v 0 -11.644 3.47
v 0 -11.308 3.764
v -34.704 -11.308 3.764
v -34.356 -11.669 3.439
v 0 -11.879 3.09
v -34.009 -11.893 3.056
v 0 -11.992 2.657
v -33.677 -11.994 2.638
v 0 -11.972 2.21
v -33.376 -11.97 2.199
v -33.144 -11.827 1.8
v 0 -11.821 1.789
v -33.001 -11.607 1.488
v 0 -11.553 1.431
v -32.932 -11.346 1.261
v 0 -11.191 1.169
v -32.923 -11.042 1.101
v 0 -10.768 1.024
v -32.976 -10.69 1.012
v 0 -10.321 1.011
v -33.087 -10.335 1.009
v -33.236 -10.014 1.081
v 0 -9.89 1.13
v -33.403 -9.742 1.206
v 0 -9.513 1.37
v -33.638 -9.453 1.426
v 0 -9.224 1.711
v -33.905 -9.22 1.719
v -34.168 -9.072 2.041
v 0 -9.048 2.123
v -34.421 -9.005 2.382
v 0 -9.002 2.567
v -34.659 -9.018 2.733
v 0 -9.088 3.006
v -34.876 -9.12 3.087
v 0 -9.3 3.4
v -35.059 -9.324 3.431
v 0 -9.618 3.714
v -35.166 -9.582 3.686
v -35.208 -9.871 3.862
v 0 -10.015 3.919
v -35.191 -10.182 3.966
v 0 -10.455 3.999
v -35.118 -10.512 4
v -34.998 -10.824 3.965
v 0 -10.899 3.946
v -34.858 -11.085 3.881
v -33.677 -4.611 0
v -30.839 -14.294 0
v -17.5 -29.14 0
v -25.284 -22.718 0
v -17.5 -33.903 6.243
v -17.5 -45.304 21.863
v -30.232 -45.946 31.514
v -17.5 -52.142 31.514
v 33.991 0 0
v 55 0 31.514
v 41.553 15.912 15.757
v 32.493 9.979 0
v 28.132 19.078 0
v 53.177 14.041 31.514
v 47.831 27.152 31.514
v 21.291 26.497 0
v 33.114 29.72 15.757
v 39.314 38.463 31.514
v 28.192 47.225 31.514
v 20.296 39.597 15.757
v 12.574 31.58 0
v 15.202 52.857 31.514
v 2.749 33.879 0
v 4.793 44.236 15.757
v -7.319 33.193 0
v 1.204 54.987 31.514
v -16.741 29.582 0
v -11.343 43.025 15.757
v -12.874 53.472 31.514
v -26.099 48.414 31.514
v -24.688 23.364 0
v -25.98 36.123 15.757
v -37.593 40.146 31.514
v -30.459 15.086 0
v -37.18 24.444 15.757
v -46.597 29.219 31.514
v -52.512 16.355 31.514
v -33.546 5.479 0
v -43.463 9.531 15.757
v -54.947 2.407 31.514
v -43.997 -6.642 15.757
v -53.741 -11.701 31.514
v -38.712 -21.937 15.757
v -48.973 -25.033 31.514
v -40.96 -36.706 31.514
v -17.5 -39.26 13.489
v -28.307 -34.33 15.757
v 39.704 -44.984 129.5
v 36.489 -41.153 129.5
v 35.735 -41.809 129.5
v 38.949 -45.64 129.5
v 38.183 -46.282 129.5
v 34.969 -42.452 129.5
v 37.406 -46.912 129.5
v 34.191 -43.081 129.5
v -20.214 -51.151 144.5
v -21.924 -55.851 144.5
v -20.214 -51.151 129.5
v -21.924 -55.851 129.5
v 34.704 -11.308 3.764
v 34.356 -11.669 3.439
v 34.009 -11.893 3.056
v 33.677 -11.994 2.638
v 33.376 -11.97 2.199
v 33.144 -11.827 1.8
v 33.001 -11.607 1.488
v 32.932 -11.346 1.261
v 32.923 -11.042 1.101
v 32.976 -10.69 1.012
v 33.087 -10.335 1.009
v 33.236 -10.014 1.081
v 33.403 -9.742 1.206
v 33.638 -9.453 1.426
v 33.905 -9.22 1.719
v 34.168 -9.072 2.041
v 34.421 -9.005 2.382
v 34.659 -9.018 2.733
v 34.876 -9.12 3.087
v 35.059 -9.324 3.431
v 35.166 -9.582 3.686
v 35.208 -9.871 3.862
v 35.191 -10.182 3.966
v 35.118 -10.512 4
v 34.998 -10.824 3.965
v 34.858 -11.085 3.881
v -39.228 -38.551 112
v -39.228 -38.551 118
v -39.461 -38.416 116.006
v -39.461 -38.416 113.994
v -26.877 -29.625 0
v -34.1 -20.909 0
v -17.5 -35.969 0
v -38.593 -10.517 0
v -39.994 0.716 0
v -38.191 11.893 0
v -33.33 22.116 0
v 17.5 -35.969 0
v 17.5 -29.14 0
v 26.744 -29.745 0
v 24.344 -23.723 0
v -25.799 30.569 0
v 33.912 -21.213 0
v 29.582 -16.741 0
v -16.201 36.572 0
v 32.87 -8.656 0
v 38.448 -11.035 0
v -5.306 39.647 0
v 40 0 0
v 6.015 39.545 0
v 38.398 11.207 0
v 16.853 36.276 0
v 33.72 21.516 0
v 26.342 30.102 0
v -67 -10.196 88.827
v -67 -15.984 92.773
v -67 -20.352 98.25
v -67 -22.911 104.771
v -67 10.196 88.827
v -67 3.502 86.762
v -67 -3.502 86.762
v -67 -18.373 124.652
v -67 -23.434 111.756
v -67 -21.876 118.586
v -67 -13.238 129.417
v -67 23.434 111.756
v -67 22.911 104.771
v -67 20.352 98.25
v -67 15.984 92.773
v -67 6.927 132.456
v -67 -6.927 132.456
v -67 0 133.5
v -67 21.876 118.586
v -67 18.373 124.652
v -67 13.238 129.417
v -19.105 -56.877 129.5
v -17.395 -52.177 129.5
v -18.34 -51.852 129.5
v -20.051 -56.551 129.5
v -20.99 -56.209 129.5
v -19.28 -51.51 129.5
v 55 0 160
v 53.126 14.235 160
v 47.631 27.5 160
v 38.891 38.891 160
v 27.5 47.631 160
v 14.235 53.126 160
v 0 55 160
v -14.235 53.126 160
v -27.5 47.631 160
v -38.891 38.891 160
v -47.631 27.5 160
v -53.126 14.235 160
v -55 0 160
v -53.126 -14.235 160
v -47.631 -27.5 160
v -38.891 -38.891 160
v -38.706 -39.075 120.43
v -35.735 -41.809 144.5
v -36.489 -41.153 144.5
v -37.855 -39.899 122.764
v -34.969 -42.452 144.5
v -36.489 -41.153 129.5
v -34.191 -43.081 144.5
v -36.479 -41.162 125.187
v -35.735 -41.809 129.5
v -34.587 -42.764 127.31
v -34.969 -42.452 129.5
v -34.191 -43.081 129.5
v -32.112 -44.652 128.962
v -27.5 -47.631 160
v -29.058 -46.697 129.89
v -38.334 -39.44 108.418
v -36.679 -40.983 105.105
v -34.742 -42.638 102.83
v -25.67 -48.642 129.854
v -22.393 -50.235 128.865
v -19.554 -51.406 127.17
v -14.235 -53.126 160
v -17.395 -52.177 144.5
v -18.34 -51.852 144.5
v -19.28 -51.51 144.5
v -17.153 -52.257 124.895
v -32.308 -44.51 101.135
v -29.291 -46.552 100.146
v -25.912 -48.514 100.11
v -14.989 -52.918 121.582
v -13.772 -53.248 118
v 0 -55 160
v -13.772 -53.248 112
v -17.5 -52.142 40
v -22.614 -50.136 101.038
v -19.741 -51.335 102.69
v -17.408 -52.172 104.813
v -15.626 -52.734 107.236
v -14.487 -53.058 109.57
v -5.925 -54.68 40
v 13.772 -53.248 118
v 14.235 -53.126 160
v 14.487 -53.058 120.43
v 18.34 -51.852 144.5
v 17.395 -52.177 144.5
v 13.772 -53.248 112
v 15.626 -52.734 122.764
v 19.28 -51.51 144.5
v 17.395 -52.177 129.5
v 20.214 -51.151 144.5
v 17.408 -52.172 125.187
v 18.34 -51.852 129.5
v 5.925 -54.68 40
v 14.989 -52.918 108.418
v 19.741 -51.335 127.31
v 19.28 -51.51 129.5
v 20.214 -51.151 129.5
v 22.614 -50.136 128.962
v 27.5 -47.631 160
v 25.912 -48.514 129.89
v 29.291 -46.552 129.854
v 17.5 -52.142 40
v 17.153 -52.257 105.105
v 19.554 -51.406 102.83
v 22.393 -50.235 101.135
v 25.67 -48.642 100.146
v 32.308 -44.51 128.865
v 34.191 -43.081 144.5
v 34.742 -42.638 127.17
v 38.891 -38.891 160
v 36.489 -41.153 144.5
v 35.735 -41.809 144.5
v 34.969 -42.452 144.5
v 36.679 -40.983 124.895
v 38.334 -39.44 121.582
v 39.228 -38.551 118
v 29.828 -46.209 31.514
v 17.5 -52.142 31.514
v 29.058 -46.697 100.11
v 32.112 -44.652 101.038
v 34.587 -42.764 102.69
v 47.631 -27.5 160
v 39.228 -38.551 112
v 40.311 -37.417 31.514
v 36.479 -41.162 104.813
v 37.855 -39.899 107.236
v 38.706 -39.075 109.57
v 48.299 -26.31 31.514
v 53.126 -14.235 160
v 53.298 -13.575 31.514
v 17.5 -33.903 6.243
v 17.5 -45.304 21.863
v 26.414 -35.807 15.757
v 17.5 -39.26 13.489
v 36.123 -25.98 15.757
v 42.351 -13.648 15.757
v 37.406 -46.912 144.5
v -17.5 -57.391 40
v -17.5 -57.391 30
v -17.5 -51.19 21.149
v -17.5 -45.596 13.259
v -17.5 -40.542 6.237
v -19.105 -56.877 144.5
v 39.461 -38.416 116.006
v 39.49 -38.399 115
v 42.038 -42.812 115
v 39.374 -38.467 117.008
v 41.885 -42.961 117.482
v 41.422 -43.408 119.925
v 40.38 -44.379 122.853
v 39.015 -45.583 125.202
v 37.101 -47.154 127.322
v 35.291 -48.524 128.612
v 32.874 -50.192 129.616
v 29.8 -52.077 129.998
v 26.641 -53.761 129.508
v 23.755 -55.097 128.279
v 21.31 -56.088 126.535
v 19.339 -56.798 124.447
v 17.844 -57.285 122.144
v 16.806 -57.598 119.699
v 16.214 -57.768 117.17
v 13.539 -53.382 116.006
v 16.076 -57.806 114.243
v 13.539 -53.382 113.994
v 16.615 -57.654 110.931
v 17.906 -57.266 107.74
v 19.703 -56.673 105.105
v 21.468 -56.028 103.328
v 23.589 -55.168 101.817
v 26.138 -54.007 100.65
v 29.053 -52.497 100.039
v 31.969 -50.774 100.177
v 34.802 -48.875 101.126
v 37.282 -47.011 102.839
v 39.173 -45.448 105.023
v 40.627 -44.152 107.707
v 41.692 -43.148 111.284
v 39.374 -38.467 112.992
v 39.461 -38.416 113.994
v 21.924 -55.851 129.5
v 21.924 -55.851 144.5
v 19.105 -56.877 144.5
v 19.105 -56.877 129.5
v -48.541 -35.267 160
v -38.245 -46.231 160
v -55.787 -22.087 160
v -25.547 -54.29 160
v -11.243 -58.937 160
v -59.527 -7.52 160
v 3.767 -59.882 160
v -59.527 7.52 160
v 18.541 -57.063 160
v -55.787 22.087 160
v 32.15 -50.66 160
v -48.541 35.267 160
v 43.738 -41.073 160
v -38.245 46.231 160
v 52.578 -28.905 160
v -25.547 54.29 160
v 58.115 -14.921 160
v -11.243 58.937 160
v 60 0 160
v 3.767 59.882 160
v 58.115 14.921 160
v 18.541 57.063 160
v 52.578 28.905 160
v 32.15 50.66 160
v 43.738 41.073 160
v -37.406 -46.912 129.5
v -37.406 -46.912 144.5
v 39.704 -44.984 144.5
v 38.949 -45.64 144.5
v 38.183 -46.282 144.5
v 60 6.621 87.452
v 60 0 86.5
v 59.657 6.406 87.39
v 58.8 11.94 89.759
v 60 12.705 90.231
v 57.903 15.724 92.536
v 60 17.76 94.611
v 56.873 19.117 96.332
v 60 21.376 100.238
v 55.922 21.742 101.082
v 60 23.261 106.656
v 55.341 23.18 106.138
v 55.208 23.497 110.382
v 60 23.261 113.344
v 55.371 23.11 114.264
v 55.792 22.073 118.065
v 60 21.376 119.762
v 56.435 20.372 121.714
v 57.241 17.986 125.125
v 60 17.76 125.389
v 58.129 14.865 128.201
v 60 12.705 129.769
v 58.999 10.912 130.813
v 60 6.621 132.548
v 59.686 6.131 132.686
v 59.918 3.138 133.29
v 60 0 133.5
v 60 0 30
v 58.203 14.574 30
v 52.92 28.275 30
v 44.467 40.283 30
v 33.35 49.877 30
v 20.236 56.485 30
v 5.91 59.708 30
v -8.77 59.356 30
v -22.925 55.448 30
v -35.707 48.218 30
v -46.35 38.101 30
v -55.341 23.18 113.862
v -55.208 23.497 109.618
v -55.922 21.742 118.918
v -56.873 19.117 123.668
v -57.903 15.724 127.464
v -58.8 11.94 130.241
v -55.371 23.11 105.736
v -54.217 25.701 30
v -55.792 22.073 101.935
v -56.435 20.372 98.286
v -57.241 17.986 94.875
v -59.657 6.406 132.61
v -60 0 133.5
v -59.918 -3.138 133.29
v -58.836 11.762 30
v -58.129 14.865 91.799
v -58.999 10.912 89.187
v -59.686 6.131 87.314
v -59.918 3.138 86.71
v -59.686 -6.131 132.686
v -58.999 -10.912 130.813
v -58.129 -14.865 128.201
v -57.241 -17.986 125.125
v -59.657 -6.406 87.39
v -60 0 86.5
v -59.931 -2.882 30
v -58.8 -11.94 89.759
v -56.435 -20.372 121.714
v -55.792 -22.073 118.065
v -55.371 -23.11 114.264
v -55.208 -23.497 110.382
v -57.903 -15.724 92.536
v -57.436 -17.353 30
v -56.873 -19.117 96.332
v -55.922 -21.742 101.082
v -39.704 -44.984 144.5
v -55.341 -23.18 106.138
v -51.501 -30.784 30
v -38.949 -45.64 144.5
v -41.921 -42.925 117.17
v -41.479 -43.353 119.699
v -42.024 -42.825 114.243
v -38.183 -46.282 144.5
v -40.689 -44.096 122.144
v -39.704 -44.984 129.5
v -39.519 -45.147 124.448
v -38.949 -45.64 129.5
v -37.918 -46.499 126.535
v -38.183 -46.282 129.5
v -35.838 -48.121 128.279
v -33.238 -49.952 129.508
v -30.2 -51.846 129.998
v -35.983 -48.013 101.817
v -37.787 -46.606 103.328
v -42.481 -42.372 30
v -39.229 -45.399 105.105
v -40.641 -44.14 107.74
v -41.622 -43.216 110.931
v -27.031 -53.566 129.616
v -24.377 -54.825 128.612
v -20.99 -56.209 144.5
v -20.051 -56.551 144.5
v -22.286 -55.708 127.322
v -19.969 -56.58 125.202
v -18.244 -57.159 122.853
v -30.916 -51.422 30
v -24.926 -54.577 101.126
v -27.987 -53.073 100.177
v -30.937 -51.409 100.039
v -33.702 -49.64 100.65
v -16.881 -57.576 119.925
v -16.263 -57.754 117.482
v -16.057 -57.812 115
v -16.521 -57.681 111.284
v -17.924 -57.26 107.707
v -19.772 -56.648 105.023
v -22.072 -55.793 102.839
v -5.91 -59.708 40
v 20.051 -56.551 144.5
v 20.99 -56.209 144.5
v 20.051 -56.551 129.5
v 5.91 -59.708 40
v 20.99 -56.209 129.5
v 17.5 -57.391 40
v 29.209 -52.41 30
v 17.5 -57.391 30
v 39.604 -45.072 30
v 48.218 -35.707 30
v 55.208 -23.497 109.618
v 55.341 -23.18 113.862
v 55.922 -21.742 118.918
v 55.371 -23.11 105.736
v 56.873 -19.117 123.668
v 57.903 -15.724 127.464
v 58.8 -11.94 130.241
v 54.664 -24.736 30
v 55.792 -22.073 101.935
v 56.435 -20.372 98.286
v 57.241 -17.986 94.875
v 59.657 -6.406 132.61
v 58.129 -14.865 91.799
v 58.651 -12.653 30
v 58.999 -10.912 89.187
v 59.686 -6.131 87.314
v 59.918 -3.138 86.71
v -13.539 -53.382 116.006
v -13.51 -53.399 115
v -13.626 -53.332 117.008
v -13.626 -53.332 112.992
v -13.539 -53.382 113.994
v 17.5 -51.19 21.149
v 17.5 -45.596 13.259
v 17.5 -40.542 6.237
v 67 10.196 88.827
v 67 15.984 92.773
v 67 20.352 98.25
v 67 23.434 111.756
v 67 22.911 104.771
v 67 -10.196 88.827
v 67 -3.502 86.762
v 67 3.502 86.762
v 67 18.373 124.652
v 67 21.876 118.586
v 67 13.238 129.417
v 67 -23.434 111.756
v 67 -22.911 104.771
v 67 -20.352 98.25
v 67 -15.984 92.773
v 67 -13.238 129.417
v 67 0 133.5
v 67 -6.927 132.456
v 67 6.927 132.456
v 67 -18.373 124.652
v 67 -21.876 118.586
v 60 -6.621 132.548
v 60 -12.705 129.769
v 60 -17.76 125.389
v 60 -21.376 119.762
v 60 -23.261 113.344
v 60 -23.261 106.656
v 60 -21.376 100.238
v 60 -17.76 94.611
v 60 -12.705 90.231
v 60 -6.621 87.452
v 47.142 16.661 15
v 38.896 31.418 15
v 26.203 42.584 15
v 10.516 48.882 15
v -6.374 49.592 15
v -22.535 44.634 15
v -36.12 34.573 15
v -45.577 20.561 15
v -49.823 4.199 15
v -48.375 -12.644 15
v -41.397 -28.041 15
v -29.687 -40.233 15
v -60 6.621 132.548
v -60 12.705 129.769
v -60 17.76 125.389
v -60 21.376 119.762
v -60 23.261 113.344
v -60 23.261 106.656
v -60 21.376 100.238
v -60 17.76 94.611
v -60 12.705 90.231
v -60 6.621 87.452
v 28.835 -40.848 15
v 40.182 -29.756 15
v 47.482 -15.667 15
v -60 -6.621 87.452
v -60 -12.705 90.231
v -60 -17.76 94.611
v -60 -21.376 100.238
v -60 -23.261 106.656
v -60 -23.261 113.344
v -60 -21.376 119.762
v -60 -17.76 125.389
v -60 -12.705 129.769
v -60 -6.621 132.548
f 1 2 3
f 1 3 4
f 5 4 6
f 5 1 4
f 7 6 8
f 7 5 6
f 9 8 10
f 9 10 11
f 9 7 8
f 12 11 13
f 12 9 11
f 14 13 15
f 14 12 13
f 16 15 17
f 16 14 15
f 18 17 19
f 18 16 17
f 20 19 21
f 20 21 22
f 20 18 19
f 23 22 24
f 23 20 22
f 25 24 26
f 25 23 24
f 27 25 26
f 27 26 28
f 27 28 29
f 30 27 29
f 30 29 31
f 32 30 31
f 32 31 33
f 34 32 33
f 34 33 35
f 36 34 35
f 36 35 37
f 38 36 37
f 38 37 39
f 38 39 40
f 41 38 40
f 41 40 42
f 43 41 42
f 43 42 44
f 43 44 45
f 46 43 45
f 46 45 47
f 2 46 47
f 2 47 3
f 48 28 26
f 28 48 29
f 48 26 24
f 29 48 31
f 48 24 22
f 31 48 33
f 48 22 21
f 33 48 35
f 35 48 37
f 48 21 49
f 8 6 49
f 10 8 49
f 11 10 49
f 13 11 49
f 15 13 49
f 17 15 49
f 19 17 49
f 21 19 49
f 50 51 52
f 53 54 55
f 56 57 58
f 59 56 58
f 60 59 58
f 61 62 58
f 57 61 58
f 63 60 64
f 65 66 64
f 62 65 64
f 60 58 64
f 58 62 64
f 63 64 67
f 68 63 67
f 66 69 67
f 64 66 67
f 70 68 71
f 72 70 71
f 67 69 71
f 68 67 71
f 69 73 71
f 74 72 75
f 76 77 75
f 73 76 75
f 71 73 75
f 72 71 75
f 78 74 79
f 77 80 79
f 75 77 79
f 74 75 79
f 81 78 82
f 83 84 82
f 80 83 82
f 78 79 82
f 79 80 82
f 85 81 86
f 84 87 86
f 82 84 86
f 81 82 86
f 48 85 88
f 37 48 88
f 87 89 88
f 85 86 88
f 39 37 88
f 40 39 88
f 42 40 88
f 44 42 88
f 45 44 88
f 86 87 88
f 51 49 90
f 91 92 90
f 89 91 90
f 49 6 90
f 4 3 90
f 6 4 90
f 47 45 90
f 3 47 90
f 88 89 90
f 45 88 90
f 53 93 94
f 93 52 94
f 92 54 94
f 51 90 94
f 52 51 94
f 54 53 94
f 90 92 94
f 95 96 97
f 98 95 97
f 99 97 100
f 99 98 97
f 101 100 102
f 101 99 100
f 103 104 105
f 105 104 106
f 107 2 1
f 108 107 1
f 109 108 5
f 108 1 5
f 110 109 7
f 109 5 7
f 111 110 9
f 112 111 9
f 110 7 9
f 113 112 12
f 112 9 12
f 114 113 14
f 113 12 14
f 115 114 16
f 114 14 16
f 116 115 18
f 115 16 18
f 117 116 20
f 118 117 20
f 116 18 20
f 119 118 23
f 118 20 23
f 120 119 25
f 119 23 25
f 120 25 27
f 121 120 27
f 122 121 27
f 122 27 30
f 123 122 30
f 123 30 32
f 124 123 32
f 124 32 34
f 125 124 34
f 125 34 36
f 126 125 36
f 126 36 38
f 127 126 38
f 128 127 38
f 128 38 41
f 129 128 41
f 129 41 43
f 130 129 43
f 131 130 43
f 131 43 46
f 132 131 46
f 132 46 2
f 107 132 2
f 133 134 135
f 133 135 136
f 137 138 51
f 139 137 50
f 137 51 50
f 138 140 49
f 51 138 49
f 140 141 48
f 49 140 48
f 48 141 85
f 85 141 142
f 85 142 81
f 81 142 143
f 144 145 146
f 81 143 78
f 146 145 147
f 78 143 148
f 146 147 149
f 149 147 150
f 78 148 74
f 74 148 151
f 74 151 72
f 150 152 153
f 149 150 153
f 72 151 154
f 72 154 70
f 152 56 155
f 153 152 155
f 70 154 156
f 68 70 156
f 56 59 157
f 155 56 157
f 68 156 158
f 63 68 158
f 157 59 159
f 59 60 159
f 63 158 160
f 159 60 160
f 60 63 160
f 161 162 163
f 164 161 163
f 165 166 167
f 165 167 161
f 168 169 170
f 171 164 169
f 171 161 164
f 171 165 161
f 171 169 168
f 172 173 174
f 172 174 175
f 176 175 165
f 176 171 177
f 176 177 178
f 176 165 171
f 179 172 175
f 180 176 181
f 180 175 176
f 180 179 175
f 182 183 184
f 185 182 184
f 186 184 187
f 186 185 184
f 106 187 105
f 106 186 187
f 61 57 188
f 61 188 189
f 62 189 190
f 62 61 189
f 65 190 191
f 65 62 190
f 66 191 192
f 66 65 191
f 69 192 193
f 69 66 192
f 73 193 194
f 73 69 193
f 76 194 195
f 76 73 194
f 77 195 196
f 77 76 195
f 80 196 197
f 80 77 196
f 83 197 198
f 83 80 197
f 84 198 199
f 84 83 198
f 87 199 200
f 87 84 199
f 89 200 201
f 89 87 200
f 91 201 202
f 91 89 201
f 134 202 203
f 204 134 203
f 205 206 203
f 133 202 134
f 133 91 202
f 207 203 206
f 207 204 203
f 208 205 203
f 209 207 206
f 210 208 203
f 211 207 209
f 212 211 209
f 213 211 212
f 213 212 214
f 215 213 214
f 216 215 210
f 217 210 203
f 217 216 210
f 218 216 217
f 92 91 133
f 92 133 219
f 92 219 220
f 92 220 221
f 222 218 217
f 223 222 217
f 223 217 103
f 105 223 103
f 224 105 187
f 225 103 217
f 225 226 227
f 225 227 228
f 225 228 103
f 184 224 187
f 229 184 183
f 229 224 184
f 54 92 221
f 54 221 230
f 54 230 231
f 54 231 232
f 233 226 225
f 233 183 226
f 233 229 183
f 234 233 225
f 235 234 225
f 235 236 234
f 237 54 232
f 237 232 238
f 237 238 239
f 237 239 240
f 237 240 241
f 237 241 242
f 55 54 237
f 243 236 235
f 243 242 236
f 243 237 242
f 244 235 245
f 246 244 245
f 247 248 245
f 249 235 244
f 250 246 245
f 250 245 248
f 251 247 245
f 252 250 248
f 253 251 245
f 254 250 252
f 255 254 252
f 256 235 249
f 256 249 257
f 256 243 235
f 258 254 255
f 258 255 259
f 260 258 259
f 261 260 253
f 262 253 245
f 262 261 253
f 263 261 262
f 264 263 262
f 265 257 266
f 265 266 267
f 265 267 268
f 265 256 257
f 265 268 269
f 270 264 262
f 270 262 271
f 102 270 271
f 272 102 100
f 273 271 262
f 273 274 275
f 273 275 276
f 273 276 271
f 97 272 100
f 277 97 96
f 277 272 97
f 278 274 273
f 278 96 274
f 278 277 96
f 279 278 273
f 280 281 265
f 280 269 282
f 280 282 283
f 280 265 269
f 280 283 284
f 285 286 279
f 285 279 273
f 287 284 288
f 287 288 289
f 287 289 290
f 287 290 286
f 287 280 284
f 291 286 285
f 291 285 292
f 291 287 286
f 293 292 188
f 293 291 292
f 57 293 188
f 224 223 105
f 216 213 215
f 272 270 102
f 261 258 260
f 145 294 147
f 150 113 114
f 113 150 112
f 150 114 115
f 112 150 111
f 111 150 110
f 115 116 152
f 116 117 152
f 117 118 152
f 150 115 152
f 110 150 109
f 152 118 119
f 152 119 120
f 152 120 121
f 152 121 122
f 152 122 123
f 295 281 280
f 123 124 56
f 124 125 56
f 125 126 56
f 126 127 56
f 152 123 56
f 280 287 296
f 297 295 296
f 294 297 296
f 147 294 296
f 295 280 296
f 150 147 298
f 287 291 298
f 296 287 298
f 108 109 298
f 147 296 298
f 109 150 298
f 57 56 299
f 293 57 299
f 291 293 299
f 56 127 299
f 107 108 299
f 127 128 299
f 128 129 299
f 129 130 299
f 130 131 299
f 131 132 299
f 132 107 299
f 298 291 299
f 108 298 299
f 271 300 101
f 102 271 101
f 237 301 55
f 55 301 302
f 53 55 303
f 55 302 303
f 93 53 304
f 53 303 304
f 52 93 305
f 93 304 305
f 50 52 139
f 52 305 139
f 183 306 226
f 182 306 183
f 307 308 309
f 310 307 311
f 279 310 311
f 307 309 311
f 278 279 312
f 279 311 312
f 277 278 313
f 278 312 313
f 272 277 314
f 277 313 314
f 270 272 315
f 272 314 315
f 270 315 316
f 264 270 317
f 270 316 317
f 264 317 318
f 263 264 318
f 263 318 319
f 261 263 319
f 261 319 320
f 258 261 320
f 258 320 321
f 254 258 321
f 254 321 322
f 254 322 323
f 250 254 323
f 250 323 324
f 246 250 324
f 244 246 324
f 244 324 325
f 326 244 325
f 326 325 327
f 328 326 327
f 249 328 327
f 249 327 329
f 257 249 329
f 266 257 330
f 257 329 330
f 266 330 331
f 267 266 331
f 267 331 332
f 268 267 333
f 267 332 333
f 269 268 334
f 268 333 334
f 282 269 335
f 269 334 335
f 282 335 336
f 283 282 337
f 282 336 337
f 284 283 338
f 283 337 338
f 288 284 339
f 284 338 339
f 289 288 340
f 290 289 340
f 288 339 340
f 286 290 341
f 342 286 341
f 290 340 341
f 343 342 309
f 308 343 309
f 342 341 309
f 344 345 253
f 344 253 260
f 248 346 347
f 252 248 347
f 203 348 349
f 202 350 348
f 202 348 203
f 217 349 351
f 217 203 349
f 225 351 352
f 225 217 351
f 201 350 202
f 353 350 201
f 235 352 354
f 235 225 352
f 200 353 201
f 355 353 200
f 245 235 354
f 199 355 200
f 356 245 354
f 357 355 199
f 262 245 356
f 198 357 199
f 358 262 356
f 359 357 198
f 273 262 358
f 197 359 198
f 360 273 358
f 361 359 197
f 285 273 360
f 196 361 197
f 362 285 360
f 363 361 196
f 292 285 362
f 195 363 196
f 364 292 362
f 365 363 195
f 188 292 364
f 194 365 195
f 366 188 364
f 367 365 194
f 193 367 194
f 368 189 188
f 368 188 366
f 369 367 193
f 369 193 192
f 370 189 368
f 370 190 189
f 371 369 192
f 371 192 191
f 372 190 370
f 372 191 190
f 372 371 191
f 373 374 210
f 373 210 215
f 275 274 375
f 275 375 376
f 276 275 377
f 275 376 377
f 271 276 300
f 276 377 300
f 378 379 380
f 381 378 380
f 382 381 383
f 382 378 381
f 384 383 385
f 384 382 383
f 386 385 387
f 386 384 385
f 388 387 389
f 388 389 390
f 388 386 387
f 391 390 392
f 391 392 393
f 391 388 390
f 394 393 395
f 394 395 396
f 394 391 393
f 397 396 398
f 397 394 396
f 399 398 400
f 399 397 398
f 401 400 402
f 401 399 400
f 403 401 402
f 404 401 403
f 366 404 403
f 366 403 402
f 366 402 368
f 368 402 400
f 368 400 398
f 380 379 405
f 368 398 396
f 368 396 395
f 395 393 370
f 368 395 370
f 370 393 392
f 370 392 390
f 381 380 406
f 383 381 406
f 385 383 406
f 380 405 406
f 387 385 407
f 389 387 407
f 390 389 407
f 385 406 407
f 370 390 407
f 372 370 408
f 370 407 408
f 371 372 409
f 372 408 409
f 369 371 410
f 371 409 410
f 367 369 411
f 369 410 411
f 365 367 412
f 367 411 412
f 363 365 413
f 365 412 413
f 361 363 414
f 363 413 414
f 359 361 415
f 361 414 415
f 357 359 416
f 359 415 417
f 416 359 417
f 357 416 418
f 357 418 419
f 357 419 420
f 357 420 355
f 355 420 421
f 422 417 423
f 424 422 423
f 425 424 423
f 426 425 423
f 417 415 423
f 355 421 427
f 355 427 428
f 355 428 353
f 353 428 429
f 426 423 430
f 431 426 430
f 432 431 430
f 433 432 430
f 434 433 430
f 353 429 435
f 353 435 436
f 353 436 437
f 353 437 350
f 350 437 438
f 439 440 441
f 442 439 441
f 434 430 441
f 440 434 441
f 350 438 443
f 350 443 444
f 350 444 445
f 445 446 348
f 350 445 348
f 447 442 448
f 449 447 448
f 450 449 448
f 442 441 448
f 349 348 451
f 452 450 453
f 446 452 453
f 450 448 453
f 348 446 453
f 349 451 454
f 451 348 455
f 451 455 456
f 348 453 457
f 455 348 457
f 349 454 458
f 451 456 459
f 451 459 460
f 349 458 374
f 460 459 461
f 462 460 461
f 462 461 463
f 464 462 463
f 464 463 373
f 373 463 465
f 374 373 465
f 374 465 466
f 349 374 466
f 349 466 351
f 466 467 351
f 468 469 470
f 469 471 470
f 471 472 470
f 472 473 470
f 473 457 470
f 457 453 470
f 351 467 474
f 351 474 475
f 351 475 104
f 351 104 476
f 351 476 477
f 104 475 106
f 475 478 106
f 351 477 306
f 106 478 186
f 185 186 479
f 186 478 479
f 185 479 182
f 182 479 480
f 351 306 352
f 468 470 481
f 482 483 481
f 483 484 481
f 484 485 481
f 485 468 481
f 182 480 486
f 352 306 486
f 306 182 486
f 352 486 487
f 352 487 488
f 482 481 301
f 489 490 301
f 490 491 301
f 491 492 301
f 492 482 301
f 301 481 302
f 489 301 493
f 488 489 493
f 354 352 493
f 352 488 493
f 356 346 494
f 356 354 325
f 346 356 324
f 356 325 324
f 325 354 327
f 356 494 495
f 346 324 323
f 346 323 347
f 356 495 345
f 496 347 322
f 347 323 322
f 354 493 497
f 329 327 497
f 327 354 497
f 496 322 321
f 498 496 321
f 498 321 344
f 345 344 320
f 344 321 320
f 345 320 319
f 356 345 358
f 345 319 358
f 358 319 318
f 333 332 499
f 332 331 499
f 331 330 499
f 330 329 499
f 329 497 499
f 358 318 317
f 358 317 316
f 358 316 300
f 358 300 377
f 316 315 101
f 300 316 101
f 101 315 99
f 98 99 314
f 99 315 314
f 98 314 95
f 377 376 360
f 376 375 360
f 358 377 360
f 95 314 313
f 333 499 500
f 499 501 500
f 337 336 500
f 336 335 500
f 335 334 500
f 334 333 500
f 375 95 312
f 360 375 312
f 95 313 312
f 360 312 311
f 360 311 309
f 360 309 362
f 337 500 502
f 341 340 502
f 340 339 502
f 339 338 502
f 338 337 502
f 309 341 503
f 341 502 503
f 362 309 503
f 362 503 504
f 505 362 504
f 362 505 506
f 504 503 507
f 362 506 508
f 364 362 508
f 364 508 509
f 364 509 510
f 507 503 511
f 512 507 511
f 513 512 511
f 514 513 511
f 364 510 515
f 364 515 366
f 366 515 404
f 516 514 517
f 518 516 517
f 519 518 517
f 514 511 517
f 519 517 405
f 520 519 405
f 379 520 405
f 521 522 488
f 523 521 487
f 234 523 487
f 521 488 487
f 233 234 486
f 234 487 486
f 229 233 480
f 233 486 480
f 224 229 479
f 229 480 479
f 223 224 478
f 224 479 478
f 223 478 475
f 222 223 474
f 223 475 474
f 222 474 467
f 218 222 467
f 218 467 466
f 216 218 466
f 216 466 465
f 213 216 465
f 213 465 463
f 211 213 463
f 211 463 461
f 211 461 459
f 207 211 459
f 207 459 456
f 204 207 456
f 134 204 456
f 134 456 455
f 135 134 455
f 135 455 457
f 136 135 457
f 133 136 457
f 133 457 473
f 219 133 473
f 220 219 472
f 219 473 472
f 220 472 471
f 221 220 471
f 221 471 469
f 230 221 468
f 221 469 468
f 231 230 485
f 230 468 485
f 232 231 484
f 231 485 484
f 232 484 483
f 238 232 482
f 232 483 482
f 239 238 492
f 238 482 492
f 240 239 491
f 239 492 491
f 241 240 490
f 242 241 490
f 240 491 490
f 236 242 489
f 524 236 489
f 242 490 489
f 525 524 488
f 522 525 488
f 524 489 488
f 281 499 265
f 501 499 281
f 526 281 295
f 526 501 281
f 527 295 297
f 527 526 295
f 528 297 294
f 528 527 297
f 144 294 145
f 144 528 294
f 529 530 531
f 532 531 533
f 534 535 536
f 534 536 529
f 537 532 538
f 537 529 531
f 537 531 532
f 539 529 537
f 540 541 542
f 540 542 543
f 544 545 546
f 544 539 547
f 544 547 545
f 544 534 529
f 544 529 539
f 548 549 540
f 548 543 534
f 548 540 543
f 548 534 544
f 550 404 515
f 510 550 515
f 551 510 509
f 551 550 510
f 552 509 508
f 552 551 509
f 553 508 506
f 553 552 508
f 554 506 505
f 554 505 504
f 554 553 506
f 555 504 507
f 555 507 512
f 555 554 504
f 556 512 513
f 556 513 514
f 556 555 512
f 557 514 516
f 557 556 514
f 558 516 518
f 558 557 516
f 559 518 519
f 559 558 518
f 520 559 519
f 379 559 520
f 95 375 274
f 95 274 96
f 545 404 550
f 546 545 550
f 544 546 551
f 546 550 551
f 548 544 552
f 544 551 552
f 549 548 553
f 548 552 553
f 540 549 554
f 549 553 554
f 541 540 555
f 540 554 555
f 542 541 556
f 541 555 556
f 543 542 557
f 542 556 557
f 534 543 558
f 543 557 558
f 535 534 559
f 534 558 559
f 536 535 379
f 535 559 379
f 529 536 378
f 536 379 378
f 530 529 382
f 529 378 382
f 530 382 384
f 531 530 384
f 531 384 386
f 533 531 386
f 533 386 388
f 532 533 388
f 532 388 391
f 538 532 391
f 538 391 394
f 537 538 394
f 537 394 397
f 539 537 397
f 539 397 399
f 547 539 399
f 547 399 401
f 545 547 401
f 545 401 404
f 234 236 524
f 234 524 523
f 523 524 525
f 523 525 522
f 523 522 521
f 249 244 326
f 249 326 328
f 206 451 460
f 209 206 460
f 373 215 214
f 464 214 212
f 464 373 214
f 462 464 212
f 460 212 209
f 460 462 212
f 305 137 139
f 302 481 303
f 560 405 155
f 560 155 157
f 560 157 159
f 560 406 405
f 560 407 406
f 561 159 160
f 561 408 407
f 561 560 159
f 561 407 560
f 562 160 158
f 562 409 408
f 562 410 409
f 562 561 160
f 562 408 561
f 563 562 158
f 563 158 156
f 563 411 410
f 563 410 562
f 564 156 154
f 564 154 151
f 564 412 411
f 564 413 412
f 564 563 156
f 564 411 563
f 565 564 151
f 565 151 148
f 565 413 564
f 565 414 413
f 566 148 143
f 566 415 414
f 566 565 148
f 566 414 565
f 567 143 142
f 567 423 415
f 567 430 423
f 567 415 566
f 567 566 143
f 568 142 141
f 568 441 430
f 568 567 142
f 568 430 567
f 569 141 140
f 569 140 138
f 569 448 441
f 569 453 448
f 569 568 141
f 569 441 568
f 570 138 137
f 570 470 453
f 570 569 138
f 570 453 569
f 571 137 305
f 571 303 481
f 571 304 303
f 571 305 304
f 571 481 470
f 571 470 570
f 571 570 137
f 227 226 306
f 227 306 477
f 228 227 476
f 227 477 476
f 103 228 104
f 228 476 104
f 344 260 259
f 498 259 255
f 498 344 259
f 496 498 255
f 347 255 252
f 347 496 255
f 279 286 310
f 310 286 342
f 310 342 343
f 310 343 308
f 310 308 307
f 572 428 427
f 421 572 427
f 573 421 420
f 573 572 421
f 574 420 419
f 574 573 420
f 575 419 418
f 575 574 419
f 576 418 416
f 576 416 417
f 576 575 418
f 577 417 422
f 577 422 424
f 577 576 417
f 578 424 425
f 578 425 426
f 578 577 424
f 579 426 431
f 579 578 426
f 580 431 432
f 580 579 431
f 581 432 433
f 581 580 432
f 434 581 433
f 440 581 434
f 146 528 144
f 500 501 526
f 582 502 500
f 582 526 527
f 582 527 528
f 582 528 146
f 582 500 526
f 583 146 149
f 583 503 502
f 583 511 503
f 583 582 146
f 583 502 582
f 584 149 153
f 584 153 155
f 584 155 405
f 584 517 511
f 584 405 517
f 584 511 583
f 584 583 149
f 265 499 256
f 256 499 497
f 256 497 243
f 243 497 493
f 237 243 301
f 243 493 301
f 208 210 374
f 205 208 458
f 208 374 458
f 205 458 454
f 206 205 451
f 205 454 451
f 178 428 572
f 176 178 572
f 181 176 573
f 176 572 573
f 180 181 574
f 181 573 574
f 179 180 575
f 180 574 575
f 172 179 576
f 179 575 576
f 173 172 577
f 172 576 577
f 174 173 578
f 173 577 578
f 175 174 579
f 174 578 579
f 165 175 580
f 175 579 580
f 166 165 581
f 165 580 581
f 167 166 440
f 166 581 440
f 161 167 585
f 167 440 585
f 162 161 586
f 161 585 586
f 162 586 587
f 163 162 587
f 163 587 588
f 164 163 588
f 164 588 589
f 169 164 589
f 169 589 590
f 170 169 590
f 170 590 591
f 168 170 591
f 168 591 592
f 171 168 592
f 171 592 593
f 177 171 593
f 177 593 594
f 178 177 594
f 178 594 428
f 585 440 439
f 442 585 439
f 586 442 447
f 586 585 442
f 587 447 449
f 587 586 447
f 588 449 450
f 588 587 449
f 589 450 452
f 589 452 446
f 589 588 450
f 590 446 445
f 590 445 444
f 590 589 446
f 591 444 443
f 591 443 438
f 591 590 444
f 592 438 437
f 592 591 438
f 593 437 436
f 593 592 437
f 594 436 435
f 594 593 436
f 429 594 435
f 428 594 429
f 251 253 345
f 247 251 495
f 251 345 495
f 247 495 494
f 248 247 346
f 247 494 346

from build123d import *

# Parameters (mm, degrees)
SKETCH1_R                            = 60
BOSS_EXTRUDE1_DEPTH                  = 160
CHAMFER1_SIZE                        = 20
CHAMFER1_SIZE2                       = 30
SHELL2_T                             = -5
SKETCH7_R                            = 15
CUT_EXTRUDE1_DEPTH                   = 7
SKETCH8_R                            = 15
CUT_EXTRUDE2_DEPTH                   = 7
SKETCH9_R                            = 23.5
BOSS_EXTRUDE2_DEPTH                  = 7
BOSS_EXTRUDE2_DIRECTION_2_REACH      = 210.806
BOSS_EXTRUDE2_DIRECTION_2_END_RADIUS = 60
SKETCH10_R                           = 23.5
BOSS_EXTRUDE3_DEPTH                  = 7
BOSS_EXTRUDE3_DIRECTION_2_REACH      = 214.906
BOSS_EXTRUDE3_DIRECTION_2_END_RADIUS = 60
SKETCH12_W                           = 35
SKETCH12_H                           = 40
CUT_EXTRUDE3_DEPTH                   = 32
CUT_EXTRUDE4_REACH                   = 221.026
CUT_EXTRUDE4_END_RADIUS              = 55
SKETCH14_W                           = 3
SKETCH14_H                           = 15
CUT_EXTRUDE5_REACH                   = 218.344
CUT_EXTRUDE5_END_RADIUS              = 55
SKETCH15_W                           = 3
SKETCH15_H                           = 15
CUT_EXTRUDE6_REACH                   = 218.344
CUT_EXTRUDE6_END_RADIUS              = 55
SKETCH16_W                           = 3
SKETCH16_H                           = 15
CUT_EXTRUDE7_REACH                   = 221.026
CUT_EXTRUDE7_END_RADIUS              = 55
SKETCH17_W                           = 3
SKETCH17_H                           = 15
BOSS_EXTRUDE5_REACH                  = 185.546
SKETCH18_R                           = 1.5
BOSS_EXTRUDE5_DIRECTION_2_REACH      = 185.546


with BuildPart() as part:
    # Sketch1 → Boss-Extrude1 (new body)
    with BuildSketch(Plane.XY):
        Circle(SKETCH1_R)
    extrude(amount=BOSS_EXTRUDE1_DEPTH)

    # Chamfer1
    chamfer1_edges = [part.edges().sort_by_distance(p)[0] for p in [
        (-60, 0, 0),
    ]]
    chamfer1_side = [part.faces().sort_by_distance(p)[0] for p in [
        (0, 0, 0),
    ]]
    chamfer(chamfer1_edges, length=CHAMFER1_SIZE, length2=CHAMFER1_SIZE2, reference=chamfer1_side[0])

    # Shell2
    shell2_openings = [part.faces().sort_by_distance(p)[0] for p in [
        (0, 0, 160),
        (0, 0, 0),
    ]]
    offset(amount=SHELL2_T, openings=shell2_openings, kind=Kind.INTERSECTION)

    # Sketch7 → Cut-Extrude1 (cut)
    with BuildSketch(Plane(origin=(-30, -51.961524227, 0), x_dir=(-0.866025403784438, 0.5000000000000011, 0), z_dir=(-0.5000000000000011, -0.866025403784438, 0))):
        with Locations(Location((0, -115, 0), (0, 0, 180))):
            Circle(SKETCH7_R)
    extrude(amount=-CUT_EXTRUDE1_DEPTH, mode=Mode.SUBTRACT)

    # Sketch8 → Cut-Extrude2 (cut)
    with BuildSketch(Plane(origin=(30, -51.961524227, 0), x_dir=(-0.8660254037844451, -0.4999999999999888, 0), z_dir=(0.4999999999999888, -0.8660254037844451, 0))):
        with Locations(Location((0, -115, 0), (0, 0, 180))):
            Circle(SKETCH8_R)
    extrude(amount=-CUT_EXTRUDE2_DEPTH, mode=Mode.SUBTRACT)

    # Sketch9 → Boss-Extrude2 (add)
    with BuildSketch(Plane.ZY.offset(60)):
        with Locations((110, 0)):
            Circle(SKETCH9_R)
    extrude(amount=BOSS_EXTRUDE2_DEPTH)

    # Boss-Extrude2 direction 2: up to this cylinder (the profile starts outside it)
    boss_extrude2_direction_2_end = Plane(origin=(0, 0, 110), z_dir=(0, 0, -1)) * Cylinder(BOSS_EXTRUDE2_DIRECTION_2_END_RADIUS, 542.612, mode=Mode.PRIVATE)
    # Sketch9 → Boss-Extrude2 direction 2 (add, up to the surface)
    with BuildSketch(Plane.ZY.offset(60), mode=Mode.PRIVATE) as boss_extrude2_direction_2_sk1:
        with Locations((110, 0)):
            Circle(SKETCH9_R)
    boss_extrude2_direction_2_tool1 = extrude(boss_extrude2_direction_2_sk1.sketch, amount=-BOSS_EXTRUDE2_DIRECTION_2_REACH, mode=Mode.PRIVATE) - boss_extrude2_direction_2_end
    add(boss_extrude2_direction_2_tool1.solids().sort_by_distance((-60, 0, 110))[0])
    add(boss_extrude2_direction_2_tool1.solids().sort_by_distance((-60, 0, 110))[1])

    # Sketch10 → Boss-Extrude3 (add)
    with BuildSketch(Plane(origin=(60, 0, 0), x_dir=(0, 0, -1), z_dir=(1, 0, 0))):
        with Locations(Location((-110, 0, 0), (0, 0, 180))):
            Circle(SKETCH10_R)
    extrude(amount=BOSS_EXTRUDE3_DEPTH)

    # Boss-Extrude3 direction 2: up to this cylinder (the profile starts outside it)
    boss_extrude3_direction_2_end = Plane(origin=(0, 0, 110), z_dir=(0, 0, -1)) * Cylinder(BOSS_EXTRUDE3_DIRECTION_2_END_RADIUS, 550.812, mode=Mode.PRIVATE)
    # Sketch10 → Boss-Extrude3 direction 2 (add, up to the surface)
    with BuildSketch(Plane(origin=(60, 0, 0), x_dir=(0, 0, -1), z_dir=(1, 0, 0)), mode=Mode.PRIVATE) as boss_extrude3_direction_2_sk1:
        with Locations(Location((-110, 0, 0), (0, 0, 180))):
            Circle(SKETCH10_R)
    boss_extrude3_direction_2_tool1 = extrude(boss_extrude3_direction_2_sk1.sketch, amount=-BOSS_EXTRUDE3_DIRECTION_2_REACH, mode=Mode.PRIVATE) - boss_extrude3_direction_2_end
    add(boss_extrude3_direction_2_tool1.solids().sort_by_distance((60, 0, 110))[0])
    add(boss_extrude3_direction_2_tool1.solids().sort_by_distance((60, 0, 110))[1])

    # Sketch12 → Cut-Extrude3 (cut)
    with BuildSketch(Plane(origin=(0, -60, 0), x_dir=(-1, 0, 0), z_dir=(0, -1, 0))):
        with Locations((0, -20)):
            Rectangle(SKETCH12_W, SKETCH12_H)
    extrude(amount=-CUT_EXTRUDE3_DEPTH, mode=Mode.SUBTRACT)

    # Cut-Extrude4: up to this cylinder (the profile starts outside it)
    cut_extrude4_end = Plane(origin=(0, 0, 137), z_dir=(0, 0, -1)) * Cylinder(CUT_EXTRUDE4_END_RADIUS, 553.052, mode=Mode.PRIVATE)
    # Sketch14 → Cut-Extrude4 (cut, up to the surface)
    with BuildSketch(Plane(origin=(38.567256581, -45.962666587, 0), x_dir=(-0.7660444431189859, -0.6427876096865299, 0), z_dir=(0.6427876096865299, -0.7660444431189859, 0)), mode=Mode.PRIVATE) as cut_extrude4_sk1:
        with Locations((0, -137)):
            Rectangle(SKETCH14_W, SKETCH14_H)
    cut_extrude4_tool1 = extrude(cut_extrude4_sk1.sketch, amount=-CUT_EXTRUDE4_REACH, mode=Mode.PRIVATE) - cut_extrude4_end
    add(cut_extrude4_tool1.solids().sort_by_distance((38.567257, -45.962667, 137))[0], mode=Mode.SUBTRACT)

    # Cut-Extrude5: up to this cylinder (the profile starts outside it)
    cut_extrude5_end = Plane(origin=(0, 0, 137), z_dir=(0, 0, -1)) * Cylinder(CUT_EXTRUDE5_END_RADIUS, 547.688, mode=Mode.PRIVATE)
    # Sketch15 → Cut-Extrude5 (cut, up to the surface)
    with BuildSketch(Plane(origin=(20.5212086, -56.381557247, 0), x_dir=(-0.9396926207859128, -0.3420201433256568, 0), z_dir=(0.3420201433256568, -0.9396926207859128, 0)), mode=Mode.PRIVATE) as cut_extrude5_sk1:
        with Locations((0, -137)):
            Rectangle(SKETCH15_W, SKETCH15_H)
    cut_extrude5_tool1 = extrude(cut_extrude5_sk1.sketch, amount=-CUT_EXTRUDE5_REACH, mode=Mode.PRIVATE) - cut_extrude5_end
    add(cut_extrude5_tool1.solids().sort_by_distance((20.521209, -56.381557, 137))[0], mode=Mode.SUBTRACT)

    # Cut-Extrude6: up to this cylinder (the profile starts outside it)
    cut_extrude6_end = Plane(origin=(0, 0, 137), z_dir=(0, 0, -1)) * Cylinder(CUT_EXTRUDE6_END_RADIUS, 547.688, mode=Mode.PRIVATE)
    # Sketch16 → Cut-Extrude6 (cut, up to the surface)
    with BuildSketch(Plane(origin=(-20.5212086, -56.381557247, 0), x_dir=(-0.9396926207859082, 0.3420201433256693, 0), z_dir=(-0.3420201433256693, -0.9396926207859082, 0)), mode=Mode.PRIVATE) as cut_extrude6_sk1:
        with Locations((0, -137)):
            Rectangle(SKETCH16_W, SKETCH16_H)
    cut_extrude6_tool1 = extrude(cut_extrude6_sk1.sketch, amount=-CUT_EXTRUDE6_REACH, mode=Mode.PRIVATE) - cut_extrude6_end
    add(cut_extrude6_tool1.solids().sort_by_distance((-20.521209, -56.381557, 137))[0], mode=Mode.SUBTRACT)

    # Cut-Extrude7: up to this cylinder (the profile starts outside it)
    cut_extrude7_end = Plane(origin=(0, 0, 137), z_dir=(0, 0, -1)) * Cylinder(CUT_EXTRUDE7_END_RADIUS, 553.052, mode=Mode.PRIVATE)
    # Sketch17 → Cut-Extrude7 (cut, up to the surface)
    with BuildSketch(Plane(origin=(-38.567256581, -45.962666587, 0), x_dir=(-0.7660444431189771, 0.6427876096865406, 0), z_dir=(-0.6427876096865405, -0.766044443118977, 0)), mode=Mode.PRIVATE) as cut_extrude7_sk1:
        with Locations((0, -137)):
            Rectangle(SKETCH17_W, SKETCH17_H)
    cut_extrude7_tool1 = extrude(cut_extrude7_sk1.sketch, amount=-CUT_EXTRUDE7_REACH, mode=Mode.PRIVATE) - cut_extrude7_end
    add(cut_extrude7_tool1.solids().sort_by_distance((-38.567257, -45.962667, 137))[0], mode=Mode.SUBTRACT)

    # Boss-Extrude5: up to this cone (the profile starts inside it)
    boss_extrude5_end = Plane(origin=(0, 0, 2.5), z_dir=(0, 0, 1)).offset(-53.486120811) * Cone(1e-06, 183.459690901, 275.189535352, align=(Align.CENTER, Align.CENTER, Align.MIN), mode=Mode.PRIVATE)
    # Sketch18 → Boss-Extrude5 (add, up to the surface)
    with BuildSketch(Plane(origin=(0, 0, 0), x_dir=(0, 0, -1), z_dir=(1, 0, 0)), mode=Mode.PRIVATE) as boss_extrude5_sk1:
        with Locations(Location((-2.5, -10.5, 0), (0, 0, 212.572301633))):
            Circle(SKETCH18_R)
    boss_extrude5_tool1 = extrude(boss_extrude5_sk1.sketch, amount=BOSS_EXTRUDE5_REACH, mode=Mode.PRIVATE) & boss_extrude5_end
    add(boss_extrude5_tool1.solids().sort_by_distance((0, -10.5, 2.5))[0])

    # Boss-Extrude5 direction 2: up to this cone (the profile starts inside it)
    boss_extrude5_direction_2_end = Plane(origin=(0, 0, 2.5), z_dir=(0, 0, 1)).offset(-53.486120811) * Cone(1e-06, 183.459690901, 275.189535352, align=(Align.CENTER, Align.CENTER, Align.MIN), mode=Mode.PRIVATE)
    # Sketch18 → Boss-Extrude5 direction 2 (add, up to the surface)
    with BuildSketch(Plane(origin=(0, 0, 0), x_dir=(0, 0, -1), z_dir=(1, 0, 0)), mode=Mode.PRIVATE) as boss_extrude5_direction_2_sk1:
        with Locations(Location((-2.5, -10.5, 0), (0, 0, 212.572301633))):
            Circle(SKETCH18_R)
    boss_extrude5_direction_2_tool1 = extrude(boss_extrude5_direction_2_sk1.sketch, amount=-BOSS_EXTRUDE5_DIRECTION_2_REACH, mode=Mode.PRIVATE) & boss_extrude5_direction_2_end
    add(boss_extrude5_direction_2_tool1.solids().sort_by_distance((0, -10.5, 2.5))[0])


solid = part.part
